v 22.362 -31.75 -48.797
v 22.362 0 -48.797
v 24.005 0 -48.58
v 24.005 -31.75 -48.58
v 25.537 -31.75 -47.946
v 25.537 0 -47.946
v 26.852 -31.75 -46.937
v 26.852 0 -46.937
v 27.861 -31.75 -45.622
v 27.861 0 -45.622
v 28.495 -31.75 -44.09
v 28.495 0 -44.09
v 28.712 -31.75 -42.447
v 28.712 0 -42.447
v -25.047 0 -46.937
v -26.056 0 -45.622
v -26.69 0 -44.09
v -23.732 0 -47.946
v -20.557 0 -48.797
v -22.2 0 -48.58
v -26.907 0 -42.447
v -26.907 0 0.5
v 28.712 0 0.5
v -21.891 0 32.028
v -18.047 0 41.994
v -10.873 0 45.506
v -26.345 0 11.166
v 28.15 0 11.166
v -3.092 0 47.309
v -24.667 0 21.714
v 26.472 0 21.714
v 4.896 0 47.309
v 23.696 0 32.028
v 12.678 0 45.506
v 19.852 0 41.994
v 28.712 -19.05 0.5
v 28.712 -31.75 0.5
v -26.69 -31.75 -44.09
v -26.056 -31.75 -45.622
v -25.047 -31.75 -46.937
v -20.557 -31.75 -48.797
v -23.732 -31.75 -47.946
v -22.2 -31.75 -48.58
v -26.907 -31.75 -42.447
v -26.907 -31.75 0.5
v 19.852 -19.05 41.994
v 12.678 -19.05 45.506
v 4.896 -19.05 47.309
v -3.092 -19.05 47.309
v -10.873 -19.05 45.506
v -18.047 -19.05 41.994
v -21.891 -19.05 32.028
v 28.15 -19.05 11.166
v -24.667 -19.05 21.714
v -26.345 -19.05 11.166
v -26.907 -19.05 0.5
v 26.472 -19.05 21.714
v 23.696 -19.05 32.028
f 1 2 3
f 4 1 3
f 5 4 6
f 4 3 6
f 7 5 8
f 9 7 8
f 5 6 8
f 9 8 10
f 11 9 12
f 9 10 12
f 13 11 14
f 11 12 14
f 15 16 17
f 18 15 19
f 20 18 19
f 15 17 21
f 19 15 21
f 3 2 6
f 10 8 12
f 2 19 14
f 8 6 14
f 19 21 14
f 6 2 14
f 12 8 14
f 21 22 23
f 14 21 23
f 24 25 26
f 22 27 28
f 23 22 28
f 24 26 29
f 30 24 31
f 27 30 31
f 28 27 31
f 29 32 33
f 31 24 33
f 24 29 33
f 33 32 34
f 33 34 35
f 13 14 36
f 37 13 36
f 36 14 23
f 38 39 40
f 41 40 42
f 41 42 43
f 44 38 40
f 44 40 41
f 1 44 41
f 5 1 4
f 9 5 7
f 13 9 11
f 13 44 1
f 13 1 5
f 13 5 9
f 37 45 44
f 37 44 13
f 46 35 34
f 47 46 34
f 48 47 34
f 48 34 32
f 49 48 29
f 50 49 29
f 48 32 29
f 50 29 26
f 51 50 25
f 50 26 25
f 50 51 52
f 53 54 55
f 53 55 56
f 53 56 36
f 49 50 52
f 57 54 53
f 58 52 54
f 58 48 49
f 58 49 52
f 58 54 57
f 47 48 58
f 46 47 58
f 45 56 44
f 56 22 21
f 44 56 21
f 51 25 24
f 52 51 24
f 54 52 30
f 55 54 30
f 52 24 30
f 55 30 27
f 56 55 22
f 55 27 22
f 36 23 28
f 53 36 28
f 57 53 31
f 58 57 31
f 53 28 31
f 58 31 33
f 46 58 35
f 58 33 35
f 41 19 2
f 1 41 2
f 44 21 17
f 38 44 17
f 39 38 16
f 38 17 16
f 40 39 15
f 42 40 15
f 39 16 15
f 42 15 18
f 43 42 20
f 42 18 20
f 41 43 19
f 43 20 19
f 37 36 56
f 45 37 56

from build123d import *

# Parameters (mm, degrees)
F1_DEPTH = 19.05
F2_DEPTH = 31.75


with BuildPart() as f1:
    # F0 (on Front) → F1 (new body)
    with BuildSketch(Plane.XZ):
        with BuildLine():
            ThreePointArc((-18.047368, 41.993555), (-24.667298, 21.714159), (-26.906852, 0.4995))
            Line((-26.906852, 0.4995), (28.711593, 0.4995))
            ThreePointArc((28.711593, 0.4995), (26.472039, 21.714159), (19.852109, 41.993555))
            ThreePointArc((19.852109, 41.993555), (0.902371, 47.536649), (-18.047368, 41.993555))
        make_face()
    extrude(amount=F1_DEPTH)

    # F0 (on Front) → F2 (join)
    with BuildSketch(Plane.XZ):
        with BuildLine():
            ThreePointArc((-26.906852, -42.446553), (-25.04698, -46.936681), (-20.556852, -48.796553))
            Line((-20.556852, -48.796553), (22.361593, -48.796553))
            ThreePointArc((22.361593, -48.796553), (26.851721, -46.936681), (28.711593, -42.446553))
            Line((28.711593, -42.446553), (28.711593, 0.4995))
            Line((28.711593, 0.4995), (-26.906852, 0.4995))
            Line((-26.906852, 0.4995), (-26.906852, -42.446553))
        make_face()
    extrude(amount=F2_DEPTH)


solid = f1.part
